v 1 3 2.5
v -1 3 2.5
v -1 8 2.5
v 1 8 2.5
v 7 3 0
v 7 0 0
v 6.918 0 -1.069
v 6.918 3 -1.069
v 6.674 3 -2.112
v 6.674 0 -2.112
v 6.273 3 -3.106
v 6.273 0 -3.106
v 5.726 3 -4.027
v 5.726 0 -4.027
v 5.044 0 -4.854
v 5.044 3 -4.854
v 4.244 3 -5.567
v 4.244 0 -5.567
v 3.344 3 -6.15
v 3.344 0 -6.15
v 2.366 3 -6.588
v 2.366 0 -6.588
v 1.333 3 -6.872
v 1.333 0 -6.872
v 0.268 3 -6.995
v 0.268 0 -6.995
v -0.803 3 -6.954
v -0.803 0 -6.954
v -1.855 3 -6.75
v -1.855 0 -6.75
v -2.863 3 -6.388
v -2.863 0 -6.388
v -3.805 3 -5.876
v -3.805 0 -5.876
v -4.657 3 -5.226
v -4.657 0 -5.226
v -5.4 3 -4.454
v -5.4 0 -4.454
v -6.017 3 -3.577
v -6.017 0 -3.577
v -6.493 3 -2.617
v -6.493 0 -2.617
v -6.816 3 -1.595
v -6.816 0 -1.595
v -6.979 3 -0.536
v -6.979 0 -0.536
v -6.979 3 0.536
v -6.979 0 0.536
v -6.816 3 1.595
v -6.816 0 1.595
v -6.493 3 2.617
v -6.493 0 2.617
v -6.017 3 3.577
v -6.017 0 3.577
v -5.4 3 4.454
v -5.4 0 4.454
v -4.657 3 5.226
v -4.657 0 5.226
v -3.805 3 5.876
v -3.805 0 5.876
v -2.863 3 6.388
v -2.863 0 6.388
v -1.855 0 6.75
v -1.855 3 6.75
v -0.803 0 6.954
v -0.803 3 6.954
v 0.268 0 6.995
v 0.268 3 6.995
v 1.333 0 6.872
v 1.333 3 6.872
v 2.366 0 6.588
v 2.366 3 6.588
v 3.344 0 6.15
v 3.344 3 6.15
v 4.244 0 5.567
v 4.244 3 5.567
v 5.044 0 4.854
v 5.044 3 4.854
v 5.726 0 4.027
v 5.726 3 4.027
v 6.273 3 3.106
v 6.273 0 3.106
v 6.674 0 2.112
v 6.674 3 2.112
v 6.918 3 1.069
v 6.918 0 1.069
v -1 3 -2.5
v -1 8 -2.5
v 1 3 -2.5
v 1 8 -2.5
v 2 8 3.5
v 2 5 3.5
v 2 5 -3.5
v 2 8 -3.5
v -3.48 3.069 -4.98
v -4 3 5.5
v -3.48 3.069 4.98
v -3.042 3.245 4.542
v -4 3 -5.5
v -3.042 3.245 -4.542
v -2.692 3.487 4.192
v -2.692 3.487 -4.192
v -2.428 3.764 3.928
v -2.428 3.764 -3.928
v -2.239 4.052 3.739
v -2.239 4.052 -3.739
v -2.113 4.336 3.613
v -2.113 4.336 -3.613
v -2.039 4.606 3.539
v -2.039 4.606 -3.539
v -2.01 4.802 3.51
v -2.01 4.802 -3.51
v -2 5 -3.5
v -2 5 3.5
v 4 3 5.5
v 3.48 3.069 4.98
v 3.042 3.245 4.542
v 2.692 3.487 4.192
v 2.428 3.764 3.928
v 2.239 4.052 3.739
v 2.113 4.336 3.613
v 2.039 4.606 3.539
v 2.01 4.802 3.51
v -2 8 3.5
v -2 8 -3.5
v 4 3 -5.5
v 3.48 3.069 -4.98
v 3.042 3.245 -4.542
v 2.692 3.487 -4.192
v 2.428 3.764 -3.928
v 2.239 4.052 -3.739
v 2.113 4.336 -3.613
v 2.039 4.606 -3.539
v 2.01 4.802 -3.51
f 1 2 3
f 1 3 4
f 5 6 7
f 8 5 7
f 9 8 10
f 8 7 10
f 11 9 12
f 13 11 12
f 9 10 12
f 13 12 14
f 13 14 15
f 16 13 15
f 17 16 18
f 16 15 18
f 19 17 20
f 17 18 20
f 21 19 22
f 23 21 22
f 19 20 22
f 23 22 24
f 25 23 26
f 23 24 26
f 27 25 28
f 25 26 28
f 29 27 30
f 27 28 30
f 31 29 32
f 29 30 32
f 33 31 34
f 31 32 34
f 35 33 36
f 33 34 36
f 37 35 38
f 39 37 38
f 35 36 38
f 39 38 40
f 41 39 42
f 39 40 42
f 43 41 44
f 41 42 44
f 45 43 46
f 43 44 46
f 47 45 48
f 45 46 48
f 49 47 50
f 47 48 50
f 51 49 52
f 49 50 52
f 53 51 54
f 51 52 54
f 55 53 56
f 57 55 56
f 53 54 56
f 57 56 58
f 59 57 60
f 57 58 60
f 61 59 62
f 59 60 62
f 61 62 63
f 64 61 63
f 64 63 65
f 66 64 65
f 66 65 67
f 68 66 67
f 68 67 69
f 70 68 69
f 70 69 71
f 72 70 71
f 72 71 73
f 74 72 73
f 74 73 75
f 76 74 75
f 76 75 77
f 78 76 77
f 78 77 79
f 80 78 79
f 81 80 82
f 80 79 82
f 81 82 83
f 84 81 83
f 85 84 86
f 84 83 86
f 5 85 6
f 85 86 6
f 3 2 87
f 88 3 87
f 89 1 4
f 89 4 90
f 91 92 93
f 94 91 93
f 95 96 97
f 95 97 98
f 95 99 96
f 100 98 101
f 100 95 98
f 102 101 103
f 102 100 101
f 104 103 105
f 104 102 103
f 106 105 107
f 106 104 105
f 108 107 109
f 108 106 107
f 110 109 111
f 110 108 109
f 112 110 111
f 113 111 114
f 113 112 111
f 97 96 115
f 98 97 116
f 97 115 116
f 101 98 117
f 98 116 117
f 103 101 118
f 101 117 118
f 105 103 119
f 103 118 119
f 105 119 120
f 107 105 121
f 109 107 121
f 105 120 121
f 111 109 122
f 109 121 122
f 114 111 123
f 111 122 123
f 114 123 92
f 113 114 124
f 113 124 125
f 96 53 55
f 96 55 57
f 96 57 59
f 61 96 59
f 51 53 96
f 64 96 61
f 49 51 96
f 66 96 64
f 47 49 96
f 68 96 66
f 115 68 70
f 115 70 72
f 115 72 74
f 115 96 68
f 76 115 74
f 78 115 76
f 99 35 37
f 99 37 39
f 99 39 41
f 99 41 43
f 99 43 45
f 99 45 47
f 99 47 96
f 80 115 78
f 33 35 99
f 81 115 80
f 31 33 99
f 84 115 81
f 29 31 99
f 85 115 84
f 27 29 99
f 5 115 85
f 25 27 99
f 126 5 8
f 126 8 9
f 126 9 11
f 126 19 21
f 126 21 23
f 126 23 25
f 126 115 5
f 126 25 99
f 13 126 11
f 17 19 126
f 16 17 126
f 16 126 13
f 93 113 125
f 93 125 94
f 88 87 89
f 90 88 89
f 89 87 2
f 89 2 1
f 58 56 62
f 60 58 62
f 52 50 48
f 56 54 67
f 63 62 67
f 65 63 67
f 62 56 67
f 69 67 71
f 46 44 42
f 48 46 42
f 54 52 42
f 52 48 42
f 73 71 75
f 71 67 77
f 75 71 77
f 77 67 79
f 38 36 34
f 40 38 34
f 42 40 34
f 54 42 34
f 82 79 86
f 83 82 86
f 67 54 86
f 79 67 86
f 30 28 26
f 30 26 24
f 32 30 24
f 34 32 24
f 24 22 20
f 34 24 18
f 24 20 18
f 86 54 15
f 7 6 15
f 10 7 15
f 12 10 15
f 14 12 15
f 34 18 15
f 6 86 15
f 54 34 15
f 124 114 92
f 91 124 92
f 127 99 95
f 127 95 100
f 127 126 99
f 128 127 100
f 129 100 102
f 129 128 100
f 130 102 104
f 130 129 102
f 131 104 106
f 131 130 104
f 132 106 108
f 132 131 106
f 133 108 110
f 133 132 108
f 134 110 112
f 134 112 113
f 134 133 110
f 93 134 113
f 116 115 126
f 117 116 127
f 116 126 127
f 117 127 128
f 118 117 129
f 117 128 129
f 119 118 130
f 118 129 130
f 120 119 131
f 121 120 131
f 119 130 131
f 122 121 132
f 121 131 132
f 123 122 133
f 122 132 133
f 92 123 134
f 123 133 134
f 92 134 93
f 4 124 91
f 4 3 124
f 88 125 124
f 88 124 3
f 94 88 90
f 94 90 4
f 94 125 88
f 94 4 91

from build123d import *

# Parameters (mm, degrees)
SKETCH1_R           = 7
BOSS_EXTRUDE1_DEPTH = 3
SKETCH2_W           = 4
SKETCH2_H           = 7
SKETCH2_W_2         = 2
SKETCH2_H_2         = 5
BOSS_EXTRUDE2_DEPTH = 5
FILLET1_R           = 2


with BuildPart() as part:
    # Sketch1 → Boss-Extrude1 (new body)
    with BuildSketch(Plane(origin=(0, 0, 0), x_dir=(1, 0, 0), z_dir=(0, 1, 0))):
        Circle(SKETCH1_R)
    extrude(amount=BOSS_EXTRUDE1_DEPTH)

    # Sketch2 → Boss-Extrude2 (add)
    with BuildSketch(Plane(origin=(0, 3, 0), x_dir=(1, 0, 0), z_dir=(0, 1, 0))):
        Rectangle(SKETCH2_W, SKETCH2_H)
        Rectangle(SKETCH2_W_2, SKETCH2_H_2, mode=Mode.SUBTRACT)
    extrude(amount=BOSS_EXTRUDE2_DEPTH)

    # Fillet1
    fillet1_edges = [part.edges().sort_by_distance(p)[0] for p in [
        (-2, 3, 0),
        (0, 3, -3.5),
        (2, 3, 0),
        (0, 3, 3.5),
    ]]
    fillet(fillet1_edges, radius=FILLET1_R)


solid = part.part
